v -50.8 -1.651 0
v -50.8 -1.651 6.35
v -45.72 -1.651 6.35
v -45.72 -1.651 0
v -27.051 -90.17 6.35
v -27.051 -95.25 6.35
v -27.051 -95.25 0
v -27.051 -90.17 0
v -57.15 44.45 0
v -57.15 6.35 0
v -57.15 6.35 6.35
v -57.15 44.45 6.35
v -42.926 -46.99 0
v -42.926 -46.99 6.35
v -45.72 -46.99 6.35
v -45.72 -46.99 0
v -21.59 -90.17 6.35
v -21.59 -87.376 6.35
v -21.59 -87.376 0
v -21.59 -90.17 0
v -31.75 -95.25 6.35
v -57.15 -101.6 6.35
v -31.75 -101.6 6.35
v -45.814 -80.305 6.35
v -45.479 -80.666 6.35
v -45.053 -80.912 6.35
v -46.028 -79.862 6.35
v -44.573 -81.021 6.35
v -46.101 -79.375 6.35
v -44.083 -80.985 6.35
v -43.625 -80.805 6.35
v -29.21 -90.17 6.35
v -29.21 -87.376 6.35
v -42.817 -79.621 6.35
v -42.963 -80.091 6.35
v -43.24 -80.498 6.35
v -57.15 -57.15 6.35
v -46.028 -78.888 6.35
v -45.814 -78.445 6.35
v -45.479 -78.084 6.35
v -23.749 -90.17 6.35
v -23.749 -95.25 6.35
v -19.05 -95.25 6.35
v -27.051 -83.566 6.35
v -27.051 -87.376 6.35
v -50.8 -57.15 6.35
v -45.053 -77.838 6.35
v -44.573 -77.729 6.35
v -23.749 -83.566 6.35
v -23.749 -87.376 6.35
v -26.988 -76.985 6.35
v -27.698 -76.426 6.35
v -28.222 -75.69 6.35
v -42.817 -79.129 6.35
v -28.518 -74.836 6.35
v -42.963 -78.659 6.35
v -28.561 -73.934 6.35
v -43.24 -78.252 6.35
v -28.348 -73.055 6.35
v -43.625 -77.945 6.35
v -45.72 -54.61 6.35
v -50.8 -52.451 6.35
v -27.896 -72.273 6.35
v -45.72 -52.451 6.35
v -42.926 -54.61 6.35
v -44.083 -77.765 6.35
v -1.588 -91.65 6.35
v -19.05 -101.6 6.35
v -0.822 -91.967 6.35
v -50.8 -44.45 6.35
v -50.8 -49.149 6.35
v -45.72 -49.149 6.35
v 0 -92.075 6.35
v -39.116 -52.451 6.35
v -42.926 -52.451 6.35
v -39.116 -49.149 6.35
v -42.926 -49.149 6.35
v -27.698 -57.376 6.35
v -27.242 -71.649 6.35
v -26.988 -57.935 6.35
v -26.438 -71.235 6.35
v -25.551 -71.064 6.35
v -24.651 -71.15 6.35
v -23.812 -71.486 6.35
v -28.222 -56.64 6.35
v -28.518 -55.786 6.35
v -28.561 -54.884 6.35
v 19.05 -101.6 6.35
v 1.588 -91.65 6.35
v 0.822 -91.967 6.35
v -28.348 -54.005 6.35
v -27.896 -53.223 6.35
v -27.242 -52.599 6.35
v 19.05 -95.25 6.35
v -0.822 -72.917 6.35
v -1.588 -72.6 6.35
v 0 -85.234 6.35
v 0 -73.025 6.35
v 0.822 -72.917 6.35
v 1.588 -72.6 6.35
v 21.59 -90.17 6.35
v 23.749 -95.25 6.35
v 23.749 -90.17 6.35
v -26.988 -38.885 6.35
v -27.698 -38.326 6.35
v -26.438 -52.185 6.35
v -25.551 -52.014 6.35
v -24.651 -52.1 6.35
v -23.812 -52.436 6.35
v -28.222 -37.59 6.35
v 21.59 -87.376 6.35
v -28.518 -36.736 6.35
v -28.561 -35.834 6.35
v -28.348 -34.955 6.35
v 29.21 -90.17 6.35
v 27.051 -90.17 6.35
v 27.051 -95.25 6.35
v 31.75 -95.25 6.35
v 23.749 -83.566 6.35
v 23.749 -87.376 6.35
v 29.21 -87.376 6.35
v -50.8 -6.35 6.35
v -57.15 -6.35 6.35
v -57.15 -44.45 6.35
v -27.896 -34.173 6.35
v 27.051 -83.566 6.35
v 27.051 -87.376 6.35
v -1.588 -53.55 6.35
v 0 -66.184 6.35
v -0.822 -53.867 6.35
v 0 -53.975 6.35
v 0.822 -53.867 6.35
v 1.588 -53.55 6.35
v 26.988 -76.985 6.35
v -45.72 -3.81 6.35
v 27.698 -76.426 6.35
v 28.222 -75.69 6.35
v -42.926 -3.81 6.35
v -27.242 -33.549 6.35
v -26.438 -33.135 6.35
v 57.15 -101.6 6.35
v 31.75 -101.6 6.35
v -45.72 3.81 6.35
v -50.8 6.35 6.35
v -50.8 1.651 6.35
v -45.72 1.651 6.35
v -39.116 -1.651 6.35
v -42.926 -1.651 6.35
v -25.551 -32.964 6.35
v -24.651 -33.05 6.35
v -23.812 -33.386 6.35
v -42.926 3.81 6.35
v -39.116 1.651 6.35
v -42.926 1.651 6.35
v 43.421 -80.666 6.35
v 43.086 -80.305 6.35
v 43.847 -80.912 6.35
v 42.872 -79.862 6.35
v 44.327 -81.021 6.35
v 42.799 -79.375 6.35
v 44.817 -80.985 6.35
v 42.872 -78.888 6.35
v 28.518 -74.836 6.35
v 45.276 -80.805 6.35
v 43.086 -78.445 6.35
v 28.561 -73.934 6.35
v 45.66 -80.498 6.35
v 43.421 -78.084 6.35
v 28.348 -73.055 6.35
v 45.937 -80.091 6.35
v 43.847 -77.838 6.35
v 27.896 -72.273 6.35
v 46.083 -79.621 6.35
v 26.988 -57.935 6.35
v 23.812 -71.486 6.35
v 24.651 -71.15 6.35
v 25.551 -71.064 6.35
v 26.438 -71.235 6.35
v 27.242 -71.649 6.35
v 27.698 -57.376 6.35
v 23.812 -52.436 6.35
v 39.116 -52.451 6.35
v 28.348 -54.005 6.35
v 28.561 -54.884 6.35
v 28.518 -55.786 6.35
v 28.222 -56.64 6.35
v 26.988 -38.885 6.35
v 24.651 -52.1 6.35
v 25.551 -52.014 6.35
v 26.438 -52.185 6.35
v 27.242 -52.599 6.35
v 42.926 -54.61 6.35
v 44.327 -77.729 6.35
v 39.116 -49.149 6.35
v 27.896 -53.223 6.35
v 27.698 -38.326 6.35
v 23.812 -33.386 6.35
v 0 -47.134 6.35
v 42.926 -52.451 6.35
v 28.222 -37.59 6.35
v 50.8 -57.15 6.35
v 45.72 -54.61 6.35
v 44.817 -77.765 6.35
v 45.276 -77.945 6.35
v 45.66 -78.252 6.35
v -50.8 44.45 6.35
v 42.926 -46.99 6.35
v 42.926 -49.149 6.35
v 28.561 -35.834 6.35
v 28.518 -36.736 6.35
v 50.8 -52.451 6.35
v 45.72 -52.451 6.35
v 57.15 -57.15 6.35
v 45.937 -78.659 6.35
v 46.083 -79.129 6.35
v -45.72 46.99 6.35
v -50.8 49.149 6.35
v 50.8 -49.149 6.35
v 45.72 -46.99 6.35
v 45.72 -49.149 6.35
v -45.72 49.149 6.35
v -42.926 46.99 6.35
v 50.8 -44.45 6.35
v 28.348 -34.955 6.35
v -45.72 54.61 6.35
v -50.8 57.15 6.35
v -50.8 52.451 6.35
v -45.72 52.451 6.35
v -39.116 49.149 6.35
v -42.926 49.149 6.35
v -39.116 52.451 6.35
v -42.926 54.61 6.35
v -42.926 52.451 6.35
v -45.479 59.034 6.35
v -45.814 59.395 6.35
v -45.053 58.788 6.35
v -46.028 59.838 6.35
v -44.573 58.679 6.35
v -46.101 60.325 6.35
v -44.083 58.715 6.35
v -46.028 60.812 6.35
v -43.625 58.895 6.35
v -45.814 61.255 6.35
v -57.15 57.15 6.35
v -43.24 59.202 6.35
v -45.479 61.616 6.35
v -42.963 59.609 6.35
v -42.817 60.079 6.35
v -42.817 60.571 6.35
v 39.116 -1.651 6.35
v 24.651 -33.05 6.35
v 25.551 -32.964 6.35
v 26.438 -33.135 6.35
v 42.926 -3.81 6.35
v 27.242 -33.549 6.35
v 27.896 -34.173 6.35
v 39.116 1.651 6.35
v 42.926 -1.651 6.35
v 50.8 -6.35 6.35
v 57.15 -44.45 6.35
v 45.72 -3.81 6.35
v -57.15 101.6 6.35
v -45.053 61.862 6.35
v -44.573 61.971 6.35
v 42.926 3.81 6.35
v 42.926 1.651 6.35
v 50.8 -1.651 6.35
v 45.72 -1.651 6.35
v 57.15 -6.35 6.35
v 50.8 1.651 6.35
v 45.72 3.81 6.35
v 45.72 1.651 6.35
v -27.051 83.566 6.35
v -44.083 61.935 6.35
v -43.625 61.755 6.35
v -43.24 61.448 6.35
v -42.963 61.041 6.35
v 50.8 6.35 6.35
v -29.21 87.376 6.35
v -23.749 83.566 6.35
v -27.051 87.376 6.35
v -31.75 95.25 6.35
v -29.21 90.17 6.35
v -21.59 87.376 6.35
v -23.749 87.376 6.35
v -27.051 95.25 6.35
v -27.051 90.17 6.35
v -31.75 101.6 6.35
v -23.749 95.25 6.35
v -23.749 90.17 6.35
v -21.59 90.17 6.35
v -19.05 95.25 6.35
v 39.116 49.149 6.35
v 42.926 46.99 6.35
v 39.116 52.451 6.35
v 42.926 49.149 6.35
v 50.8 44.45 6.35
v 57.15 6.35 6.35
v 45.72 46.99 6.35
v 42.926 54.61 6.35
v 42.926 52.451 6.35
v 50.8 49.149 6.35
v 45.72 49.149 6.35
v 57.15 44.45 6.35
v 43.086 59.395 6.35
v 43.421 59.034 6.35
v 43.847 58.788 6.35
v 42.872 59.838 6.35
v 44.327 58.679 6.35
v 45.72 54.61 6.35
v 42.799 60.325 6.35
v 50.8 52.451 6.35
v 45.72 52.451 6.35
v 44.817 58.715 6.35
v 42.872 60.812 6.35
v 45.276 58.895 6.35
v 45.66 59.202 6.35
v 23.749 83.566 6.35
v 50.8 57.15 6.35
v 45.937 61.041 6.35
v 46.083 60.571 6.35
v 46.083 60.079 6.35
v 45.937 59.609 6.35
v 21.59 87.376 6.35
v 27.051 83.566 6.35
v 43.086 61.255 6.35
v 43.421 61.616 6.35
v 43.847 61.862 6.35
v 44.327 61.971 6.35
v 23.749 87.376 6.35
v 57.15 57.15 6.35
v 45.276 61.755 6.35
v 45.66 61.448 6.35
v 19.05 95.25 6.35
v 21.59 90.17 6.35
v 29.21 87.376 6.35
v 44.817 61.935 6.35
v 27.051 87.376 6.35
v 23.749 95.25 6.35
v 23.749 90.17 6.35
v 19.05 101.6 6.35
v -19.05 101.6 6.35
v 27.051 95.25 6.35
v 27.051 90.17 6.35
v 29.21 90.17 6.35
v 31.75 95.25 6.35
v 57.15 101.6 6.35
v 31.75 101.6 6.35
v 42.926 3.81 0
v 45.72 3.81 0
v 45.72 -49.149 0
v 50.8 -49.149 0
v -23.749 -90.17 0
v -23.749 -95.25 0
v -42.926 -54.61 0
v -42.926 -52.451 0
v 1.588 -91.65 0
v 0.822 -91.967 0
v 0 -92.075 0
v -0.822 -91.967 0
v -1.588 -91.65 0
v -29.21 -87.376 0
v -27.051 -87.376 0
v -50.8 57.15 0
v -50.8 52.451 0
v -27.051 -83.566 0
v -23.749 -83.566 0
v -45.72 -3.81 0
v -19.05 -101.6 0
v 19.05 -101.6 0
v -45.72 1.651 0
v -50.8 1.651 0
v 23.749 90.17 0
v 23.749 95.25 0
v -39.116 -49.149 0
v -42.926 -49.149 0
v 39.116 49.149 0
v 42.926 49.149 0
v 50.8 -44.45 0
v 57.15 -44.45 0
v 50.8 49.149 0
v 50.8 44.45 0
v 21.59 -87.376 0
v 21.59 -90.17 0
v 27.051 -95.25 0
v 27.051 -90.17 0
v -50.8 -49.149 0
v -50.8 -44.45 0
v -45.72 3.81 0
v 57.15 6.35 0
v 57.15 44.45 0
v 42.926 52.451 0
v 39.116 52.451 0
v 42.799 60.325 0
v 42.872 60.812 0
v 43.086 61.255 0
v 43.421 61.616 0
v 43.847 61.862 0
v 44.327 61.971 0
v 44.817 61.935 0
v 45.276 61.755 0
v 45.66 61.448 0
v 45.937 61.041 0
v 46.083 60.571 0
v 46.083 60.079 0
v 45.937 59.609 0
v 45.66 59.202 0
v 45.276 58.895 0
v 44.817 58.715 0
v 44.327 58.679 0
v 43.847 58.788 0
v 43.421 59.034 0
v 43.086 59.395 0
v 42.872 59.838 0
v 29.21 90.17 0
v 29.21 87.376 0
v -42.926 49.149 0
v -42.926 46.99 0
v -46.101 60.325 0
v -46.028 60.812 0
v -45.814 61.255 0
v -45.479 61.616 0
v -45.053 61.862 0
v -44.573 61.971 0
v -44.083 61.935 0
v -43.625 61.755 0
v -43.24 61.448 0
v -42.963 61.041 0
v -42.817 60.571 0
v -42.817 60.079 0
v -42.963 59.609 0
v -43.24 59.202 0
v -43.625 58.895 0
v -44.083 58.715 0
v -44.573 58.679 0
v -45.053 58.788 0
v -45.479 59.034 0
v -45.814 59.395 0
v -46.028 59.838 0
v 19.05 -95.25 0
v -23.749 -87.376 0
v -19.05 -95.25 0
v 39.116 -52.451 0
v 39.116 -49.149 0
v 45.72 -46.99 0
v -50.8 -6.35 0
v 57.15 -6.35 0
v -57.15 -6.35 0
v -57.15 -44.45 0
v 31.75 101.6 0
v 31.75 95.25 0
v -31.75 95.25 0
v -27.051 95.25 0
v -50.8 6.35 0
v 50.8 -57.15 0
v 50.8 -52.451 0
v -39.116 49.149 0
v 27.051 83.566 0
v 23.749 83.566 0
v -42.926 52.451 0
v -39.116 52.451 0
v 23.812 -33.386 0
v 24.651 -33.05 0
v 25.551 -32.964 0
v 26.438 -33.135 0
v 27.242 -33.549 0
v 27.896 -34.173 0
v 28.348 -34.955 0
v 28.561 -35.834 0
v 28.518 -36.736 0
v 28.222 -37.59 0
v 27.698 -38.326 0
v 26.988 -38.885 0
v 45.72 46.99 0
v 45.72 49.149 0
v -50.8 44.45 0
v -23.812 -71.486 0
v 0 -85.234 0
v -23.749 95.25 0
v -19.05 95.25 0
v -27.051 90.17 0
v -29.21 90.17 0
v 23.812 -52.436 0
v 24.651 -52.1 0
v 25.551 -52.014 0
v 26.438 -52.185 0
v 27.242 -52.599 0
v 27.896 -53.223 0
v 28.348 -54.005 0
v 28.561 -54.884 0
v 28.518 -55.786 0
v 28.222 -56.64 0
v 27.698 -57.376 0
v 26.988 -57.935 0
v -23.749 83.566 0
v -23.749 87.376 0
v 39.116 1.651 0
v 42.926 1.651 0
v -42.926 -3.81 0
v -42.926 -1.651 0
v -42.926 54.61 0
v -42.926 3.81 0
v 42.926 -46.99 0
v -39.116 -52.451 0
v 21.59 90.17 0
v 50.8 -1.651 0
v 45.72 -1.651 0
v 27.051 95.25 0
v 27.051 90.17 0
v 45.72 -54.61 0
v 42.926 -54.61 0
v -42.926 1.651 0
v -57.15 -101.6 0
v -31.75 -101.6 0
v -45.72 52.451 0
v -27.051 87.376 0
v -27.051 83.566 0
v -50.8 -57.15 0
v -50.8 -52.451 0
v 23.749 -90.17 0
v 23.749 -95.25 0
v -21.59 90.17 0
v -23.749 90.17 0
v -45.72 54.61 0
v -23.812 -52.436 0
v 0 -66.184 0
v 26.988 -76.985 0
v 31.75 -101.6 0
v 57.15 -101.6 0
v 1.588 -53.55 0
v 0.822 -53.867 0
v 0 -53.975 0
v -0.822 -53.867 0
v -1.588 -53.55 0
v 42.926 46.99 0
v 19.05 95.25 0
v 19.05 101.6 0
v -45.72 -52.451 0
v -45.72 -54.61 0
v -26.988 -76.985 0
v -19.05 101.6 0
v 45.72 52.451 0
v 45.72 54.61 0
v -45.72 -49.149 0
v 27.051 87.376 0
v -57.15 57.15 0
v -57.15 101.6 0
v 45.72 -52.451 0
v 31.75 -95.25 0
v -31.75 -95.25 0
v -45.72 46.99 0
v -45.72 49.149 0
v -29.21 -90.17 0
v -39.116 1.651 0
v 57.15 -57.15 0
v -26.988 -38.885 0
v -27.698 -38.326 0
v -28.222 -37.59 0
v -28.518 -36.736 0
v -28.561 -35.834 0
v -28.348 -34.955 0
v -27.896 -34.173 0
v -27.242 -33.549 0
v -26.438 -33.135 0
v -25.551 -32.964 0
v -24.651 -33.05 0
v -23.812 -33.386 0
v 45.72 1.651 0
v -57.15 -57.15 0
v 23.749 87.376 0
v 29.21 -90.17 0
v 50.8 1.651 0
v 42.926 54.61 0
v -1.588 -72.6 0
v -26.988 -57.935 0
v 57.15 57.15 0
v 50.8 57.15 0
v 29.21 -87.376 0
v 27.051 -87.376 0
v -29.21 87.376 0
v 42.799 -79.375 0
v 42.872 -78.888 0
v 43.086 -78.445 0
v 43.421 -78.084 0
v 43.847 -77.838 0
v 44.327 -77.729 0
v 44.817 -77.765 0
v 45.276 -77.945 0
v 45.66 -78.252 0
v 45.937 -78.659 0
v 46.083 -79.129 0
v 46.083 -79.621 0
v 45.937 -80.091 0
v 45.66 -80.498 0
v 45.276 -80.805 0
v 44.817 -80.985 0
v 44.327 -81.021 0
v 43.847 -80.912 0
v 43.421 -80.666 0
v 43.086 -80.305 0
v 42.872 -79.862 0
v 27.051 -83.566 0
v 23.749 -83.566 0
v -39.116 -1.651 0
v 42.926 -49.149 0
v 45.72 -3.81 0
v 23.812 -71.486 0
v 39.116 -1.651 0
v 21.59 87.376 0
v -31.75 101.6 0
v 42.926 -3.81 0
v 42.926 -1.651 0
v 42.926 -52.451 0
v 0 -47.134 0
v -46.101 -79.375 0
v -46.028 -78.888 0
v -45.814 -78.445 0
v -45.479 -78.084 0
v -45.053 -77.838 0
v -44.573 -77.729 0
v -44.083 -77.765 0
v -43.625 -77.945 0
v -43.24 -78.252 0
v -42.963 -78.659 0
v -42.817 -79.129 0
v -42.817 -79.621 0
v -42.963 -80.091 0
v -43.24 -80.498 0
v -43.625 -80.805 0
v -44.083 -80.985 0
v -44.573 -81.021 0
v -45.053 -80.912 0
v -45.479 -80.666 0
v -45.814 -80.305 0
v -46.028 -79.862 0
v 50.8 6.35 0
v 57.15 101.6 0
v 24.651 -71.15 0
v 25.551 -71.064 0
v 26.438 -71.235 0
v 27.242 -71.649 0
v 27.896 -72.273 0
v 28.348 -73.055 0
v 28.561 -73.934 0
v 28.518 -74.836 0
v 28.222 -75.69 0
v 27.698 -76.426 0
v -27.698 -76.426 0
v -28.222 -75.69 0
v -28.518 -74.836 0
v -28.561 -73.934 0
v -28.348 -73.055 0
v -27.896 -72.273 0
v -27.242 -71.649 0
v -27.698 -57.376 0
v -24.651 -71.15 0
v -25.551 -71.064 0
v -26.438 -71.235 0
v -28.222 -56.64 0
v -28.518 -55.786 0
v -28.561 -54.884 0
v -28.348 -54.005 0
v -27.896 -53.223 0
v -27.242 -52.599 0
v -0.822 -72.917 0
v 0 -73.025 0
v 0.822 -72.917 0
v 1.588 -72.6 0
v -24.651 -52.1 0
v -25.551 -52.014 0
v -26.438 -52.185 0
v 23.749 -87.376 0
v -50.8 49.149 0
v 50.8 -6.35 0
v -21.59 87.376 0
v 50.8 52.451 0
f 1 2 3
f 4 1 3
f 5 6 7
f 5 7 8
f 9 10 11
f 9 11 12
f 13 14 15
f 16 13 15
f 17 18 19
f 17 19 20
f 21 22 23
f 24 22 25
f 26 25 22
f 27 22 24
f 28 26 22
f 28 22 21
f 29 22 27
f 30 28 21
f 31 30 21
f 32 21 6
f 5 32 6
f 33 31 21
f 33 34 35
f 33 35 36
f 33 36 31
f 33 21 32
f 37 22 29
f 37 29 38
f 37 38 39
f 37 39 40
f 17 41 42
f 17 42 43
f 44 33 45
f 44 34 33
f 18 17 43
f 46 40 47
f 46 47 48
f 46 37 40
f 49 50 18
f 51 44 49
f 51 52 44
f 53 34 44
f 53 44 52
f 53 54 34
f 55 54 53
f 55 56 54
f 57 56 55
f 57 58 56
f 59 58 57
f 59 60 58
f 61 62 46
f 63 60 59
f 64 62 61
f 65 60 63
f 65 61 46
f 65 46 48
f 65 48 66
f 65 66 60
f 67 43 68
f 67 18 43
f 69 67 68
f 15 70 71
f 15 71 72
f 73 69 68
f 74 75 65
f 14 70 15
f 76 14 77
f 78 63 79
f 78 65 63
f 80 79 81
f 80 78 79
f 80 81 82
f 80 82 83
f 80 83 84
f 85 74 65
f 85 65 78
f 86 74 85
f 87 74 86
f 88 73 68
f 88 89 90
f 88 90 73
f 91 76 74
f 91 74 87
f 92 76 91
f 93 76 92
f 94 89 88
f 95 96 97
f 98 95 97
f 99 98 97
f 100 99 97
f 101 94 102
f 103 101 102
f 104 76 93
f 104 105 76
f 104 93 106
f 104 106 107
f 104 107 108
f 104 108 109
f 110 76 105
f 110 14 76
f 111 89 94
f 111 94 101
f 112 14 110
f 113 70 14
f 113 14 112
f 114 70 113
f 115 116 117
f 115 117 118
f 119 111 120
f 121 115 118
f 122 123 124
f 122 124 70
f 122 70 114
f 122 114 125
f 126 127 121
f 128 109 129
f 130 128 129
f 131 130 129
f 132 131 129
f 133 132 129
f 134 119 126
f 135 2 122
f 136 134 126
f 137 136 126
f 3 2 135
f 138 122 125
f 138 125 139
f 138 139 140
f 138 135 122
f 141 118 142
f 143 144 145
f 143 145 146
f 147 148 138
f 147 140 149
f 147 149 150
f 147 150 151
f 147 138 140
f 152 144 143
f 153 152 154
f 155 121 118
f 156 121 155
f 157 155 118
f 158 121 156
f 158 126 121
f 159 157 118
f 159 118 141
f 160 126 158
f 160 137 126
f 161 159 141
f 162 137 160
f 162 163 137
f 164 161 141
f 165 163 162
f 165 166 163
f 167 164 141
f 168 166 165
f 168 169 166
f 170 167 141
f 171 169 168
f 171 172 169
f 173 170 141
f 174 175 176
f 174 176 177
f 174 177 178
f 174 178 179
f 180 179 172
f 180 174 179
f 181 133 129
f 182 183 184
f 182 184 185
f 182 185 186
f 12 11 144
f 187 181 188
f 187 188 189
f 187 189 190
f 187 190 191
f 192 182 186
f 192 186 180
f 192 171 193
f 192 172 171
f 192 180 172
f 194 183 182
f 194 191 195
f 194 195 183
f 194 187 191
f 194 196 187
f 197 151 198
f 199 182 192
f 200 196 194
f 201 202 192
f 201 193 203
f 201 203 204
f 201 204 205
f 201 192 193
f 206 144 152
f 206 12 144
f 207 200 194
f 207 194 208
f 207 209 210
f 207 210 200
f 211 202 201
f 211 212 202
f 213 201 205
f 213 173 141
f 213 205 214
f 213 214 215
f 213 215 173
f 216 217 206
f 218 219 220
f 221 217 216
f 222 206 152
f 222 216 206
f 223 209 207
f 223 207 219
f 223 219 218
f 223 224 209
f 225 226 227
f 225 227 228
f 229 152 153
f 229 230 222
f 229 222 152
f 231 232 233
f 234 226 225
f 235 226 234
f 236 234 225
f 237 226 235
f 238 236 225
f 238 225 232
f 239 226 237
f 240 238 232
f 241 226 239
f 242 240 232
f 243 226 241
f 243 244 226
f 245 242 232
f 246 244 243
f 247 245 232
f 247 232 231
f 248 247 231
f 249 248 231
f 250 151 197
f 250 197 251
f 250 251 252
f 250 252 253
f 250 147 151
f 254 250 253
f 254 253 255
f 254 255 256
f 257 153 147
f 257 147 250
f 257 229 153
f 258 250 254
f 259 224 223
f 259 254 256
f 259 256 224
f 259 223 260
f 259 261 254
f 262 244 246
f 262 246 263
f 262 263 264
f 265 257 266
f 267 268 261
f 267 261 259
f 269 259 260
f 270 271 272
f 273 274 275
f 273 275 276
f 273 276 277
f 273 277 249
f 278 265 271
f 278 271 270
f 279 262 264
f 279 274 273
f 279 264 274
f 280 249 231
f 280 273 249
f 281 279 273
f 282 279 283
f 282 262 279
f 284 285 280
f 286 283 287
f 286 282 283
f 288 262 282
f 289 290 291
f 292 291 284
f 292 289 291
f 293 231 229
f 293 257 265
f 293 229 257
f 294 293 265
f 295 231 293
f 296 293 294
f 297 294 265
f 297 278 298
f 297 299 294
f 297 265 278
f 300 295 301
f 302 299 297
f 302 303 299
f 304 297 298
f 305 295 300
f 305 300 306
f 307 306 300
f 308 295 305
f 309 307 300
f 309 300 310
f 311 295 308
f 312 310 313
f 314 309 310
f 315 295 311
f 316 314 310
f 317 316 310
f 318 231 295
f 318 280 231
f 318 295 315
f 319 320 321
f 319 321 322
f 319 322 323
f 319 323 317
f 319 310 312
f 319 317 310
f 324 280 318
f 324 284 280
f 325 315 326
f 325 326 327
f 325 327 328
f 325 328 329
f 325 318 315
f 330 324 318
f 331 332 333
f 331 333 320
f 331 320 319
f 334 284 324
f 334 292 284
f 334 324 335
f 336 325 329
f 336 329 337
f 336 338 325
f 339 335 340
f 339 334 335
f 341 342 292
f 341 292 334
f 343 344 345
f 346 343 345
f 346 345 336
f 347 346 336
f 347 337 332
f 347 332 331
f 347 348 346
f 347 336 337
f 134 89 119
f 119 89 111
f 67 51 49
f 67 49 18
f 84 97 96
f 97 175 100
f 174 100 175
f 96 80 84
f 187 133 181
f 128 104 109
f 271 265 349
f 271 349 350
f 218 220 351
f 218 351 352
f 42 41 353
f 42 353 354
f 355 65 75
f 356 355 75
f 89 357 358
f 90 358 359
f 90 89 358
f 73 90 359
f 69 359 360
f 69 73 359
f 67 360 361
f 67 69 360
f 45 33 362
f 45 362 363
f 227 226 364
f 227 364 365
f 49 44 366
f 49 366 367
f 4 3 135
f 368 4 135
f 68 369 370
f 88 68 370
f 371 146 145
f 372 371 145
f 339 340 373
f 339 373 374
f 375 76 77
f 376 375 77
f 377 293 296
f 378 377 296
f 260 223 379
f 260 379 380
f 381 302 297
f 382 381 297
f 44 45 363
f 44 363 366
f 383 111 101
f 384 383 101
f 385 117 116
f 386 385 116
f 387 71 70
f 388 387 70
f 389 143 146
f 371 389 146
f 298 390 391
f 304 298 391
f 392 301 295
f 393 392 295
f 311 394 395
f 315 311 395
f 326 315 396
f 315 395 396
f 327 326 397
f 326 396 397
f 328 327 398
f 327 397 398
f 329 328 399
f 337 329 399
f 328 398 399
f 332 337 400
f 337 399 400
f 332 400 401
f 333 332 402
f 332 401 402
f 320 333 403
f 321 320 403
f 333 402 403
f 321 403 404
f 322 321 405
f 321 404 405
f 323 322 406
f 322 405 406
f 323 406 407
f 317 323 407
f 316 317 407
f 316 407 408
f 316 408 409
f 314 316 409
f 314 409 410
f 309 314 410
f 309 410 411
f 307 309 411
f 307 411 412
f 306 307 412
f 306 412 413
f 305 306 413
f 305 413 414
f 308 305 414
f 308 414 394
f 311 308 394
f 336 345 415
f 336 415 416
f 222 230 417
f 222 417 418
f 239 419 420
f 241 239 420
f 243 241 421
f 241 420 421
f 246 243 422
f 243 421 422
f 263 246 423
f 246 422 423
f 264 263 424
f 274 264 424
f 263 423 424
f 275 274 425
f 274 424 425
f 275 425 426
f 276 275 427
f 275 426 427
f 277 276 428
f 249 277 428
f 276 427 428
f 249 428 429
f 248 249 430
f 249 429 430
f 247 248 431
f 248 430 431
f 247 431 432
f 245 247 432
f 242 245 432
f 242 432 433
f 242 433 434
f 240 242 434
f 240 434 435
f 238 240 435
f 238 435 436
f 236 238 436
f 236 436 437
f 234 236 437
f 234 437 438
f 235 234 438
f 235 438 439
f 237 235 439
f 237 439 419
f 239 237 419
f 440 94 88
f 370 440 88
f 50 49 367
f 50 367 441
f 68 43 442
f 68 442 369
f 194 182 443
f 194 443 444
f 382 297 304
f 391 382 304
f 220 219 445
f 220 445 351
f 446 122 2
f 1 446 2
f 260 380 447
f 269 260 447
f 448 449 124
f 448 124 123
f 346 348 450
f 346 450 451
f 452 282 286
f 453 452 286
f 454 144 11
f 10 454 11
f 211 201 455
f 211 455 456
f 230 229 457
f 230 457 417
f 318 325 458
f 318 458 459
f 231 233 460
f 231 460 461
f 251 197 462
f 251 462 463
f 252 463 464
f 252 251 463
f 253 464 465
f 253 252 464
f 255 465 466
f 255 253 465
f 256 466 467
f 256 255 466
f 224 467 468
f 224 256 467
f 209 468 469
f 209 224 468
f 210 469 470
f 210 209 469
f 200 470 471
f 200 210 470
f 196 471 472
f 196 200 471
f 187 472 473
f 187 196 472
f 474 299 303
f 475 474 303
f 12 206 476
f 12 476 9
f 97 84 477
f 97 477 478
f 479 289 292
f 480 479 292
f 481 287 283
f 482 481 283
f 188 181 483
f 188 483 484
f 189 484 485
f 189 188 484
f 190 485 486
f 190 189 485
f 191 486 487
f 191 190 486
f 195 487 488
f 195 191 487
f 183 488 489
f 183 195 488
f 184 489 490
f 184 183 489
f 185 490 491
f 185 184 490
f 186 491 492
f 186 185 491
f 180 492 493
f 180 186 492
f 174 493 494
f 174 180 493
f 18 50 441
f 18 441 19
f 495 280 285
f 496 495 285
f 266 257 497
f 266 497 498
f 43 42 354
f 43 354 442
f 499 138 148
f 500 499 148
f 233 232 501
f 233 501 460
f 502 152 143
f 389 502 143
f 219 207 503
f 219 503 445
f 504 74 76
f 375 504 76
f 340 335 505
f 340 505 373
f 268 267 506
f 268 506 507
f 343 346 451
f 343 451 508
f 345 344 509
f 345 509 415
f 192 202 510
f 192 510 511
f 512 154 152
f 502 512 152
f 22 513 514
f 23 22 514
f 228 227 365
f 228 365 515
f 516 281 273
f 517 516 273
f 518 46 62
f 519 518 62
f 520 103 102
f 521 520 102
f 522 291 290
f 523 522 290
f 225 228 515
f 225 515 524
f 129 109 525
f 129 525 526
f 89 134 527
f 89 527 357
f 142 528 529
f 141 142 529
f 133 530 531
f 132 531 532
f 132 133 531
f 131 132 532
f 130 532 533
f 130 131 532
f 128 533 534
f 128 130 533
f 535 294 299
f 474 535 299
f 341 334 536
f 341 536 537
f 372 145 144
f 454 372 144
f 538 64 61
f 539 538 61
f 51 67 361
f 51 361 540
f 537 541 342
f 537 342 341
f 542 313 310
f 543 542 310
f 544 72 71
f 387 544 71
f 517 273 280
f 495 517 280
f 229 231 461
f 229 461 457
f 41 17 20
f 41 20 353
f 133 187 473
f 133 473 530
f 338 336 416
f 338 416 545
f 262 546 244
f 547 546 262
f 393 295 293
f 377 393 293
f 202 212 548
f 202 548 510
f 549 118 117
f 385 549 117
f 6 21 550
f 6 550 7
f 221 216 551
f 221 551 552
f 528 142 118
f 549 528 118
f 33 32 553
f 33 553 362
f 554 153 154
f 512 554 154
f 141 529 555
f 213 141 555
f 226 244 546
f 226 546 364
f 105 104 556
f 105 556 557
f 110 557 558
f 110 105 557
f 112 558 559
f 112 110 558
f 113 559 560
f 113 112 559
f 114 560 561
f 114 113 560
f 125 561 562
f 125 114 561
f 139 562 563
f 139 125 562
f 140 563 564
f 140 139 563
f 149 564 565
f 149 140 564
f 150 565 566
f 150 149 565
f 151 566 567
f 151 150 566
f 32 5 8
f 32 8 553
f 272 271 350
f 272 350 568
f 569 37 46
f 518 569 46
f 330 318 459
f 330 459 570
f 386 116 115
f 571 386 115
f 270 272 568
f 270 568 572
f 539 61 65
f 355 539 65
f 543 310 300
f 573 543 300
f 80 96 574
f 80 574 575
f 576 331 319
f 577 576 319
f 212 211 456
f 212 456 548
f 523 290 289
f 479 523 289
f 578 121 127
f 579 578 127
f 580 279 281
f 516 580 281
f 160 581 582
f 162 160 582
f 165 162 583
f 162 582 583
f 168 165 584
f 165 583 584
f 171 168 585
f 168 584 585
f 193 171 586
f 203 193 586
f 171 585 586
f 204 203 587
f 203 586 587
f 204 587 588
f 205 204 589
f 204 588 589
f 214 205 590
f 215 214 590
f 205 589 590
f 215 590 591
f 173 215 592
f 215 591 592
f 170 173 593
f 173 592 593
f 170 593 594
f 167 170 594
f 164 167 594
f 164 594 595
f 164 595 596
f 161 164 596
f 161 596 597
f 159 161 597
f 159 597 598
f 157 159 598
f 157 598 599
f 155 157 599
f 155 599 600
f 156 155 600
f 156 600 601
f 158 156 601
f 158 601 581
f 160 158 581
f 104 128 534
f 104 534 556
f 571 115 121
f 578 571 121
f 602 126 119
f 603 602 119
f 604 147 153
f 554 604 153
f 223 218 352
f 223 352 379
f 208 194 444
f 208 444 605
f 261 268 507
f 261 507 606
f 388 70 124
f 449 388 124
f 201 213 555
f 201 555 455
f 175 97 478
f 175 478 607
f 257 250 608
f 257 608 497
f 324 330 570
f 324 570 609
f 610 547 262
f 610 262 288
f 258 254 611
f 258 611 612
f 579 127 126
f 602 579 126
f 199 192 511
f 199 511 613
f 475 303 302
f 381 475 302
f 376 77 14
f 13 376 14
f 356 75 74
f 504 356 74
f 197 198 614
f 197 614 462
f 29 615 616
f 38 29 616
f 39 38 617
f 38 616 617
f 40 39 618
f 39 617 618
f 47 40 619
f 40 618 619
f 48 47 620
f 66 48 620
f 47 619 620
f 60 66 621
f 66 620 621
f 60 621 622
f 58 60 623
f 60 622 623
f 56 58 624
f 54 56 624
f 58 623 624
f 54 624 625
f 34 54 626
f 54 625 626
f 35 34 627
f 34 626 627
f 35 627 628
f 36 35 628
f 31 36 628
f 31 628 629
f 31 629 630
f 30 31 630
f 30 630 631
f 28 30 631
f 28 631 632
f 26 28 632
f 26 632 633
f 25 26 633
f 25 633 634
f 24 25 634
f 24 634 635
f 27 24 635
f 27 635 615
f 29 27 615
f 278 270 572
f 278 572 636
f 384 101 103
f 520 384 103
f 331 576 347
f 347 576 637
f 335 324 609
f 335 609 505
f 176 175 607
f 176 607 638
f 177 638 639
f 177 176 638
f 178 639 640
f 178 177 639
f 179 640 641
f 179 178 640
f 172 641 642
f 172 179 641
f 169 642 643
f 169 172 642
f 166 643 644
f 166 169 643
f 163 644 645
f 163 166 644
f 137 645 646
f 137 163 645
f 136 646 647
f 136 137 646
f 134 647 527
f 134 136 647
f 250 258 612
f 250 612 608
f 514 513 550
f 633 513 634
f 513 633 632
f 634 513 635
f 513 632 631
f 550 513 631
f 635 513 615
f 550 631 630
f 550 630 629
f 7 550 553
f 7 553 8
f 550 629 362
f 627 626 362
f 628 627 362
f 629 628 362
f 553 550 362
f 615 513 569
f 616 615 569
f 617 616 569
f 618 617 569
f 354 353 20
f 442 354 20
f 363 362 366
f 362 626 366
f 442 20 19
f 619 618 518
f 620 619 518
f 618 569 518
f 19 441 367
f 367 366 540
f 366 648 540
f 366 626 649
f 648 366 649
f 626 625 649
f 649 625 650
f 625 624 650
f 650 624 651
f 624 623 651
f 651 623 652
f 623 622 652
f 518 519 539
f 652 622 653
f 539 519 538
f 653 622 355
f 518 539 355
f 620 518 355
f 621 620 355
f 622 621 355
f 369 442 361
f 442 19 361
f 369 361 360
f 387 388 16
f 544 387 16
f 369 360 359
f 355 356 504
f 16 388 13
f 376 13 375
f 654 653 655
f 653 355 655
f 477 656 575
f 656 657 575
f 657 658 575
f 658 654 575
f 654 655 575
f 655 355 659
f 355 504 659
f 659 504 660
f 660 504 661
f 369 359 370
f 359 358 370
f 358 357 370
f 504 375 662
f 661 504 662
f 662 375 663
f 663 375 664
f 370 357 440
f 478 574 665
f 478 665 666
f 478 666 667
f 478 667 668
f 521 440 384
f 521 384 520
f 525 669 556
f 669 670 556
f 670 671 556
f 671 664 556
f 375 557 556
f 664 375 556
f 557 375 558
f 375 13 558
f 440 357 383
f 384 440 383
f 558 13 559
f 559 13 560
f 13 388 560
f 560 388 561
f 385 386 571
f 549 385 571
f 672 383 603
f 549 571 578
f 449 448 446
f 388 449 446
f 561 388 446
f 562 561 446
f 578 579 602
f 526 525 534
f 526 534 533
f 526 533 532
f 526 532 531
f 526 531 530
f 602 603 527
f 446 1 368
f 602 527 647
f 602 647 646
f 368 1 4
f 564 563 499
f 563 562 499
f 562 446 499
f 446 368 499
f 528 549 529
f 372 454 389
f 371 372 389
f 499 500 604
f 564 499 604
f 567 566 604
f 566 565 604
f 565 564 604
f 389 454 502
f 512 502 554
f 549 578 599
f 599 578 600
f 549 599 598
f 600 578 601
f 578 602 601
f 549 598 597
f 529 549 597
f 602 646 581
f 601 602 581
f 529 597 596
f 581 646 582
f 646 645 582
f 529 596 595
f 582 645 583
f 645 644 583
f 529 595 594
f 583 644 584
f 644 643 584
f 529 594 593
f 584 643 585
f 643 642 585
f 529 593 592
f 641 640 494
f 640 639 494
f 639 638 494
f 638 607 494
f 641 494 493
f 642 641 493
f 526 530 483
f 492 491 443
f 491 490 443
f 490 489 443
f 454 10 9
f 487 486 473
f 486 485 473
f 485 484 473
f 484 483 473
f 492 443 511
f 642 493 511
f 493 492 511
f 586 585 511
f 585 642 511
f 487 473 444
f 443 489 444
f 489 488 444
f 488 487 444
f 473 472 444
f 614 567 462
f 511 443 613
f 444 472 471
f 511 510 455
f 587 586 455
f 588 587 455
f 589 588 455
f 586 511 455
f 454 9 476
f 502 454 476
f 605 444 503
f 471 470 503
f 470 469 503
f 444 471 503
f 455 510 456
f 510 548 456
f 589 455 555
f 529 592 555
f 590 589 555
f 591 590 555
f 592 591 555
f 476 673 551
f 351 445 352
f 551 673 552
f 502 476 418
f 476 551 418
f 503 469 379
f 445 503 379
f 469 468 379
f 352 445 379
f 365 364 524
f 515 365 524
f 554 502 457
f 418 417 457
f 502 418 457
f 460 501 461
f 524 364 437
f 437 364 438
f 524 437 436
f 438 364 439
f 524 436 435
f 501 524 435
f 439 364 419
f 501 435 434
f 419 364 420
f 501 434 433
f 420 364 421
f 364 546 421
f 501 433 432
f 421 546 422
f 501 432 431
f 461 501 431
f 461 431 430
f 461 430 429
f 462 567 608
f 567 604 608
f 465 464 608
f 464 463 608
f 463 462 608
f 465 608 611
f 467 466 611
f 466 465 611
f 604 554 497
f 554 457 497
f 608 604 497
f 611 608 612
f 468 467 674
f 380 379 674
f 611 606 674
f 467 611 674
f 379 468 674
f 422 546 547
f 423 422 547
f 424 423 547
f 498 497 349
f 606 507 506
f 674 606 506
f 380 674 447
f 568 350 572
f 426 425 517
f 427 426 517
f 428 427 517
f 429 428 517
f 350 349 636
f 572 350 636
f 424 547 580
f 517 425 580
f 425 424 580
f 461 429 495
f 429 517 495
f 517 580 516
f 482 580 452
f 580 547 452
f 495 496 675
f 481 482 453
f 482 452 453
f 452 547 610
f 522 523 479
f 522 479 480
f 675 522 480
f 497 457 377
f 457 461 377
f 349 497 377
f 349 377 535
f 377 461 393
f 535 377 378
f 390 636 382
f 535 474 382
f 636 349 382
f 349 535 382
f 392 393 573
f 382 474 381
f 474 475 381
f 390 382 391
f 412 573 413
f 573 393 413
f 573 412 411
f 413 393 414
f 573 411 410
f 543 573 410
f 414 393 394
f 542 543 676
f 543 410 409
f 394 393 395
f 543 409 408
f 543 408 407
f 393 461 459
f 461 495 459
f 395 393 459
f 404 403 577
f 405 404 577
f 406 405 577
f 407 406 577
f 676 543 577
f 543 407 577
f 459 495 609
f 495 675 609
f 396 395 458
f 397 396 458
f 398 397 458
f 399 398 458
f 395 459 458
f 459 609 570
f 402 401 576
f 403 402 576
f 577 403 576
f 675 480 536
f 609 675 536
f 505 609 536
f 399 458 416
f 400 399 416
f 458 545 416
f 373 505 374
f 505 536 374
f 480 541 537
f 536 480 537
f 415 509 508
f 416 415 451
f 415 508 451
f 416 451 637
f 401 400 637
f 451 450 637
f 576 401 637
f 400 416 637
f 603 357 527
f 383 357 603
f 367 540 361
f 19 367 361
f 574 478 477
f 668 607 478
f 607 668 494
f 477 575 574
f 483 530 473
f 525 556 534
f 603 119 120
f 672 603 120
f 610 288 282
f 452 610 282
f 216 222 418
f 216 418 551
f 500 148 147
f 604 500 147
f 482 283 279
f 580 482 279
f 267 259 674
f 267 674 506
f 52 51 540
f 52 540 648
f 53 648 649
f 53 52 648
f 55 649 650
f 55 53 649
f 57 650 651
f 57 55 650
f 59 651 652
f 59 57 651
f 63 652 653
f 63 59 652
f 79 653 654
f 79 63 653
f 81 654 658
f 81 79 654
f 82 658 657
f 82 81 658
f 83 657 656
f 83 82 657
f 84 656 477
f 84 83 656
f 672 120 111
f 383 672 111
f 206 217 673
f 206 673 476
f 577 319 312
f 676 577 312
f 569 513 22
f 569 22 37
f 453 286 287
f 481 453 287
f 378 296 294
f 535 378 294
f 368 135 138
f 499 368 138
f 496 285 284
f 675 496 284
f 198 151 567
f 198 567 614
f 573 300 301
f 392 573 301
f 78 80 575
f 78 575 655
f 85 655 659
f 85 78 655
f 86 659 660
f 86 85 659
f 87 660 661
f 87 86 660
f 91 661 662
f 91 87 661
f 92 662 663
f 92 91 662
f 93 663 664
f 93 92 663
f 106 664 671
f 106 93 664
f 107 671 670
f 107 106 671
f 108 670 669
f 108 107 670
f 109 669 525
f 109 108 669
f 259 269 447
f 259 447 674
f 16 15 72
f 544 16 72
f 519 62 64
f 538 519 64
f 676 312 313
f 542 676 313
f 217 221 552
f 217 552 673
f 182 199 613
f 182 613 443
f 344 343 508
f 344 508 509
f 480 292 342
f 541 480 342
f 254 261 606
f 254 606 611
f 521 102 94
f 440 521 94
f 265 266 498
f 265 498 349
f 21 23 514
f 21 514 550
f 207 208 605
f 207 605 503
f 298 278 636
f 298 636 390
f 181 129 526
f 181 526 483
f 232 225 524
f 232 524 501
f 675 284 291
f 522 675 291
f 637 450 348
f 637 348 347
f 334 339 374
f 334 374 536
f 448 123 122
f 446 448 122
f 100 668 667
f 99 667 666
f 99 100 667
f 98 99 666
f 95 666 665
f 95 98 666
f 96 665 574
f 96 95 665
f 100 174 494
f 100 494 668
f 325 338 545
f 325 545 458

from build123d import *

# Parameters (mm, degrees)
SKETCH1_W            = 114.3
SKETCH1_H            = 203.2
BOSS_EXTRUDE1_DEPTH  = 6.35
CUT_EXTRUDE2_DEPTH   = 117.743329574
CUT_EXTRUDE3_DEPTH   = 117.743329574
CUT_EXTRUDE4_DEPTH   = 117.743329574
MIRROR3_COPY_1_DEPTH = 117.743329574
MIRROR3_COPY_2_DEPTH = 117.743329574
SKETCH7_R            = 1.651
CUT_EXTRUDE7_DEPTH   = 117.743329574
CUT_EXTRUDE8_DEPTH   = 117.743329574
LPATTERN1_COUNT      = 3
LPATTERN1_PITCH      = 19.05


with BuildPart() as part:
    # Sketch1 → Boss-Extrude1 (new body)
    with BuildSketch(Plane.XY):
        Rectangle(SKETCH1_W, SKETCH1_H)
    extrude(amount=BOSS_EXTRUDE1_DEPTH)

    # Sketch2 → Cut-Extrude2 (cut, through all)
    with BuildSketch(Plane.XY.offset(6.35)):
        Polygon((-57.15, 6.35), (-57.15, -6.35), (-50.8, -6.35), (-50.8, -1.651), (-45.72, -1.651), (-45.72, -3.81), (-42.926, -3.81), (-42.926, -1.651), (-39.116, -1.651), (-39.116, 1.651), (-42.926, 1.651), (-42.926, 3.81), (-45.72, 3.81), (-45.72, 1.651), (-50.8, 1.651), (-50.8, 6.35), align=None)
    cut_extrude2 = extrude(amount=-CUT_EXTRUDE2_DEPTH, mode=Mode.SUBTRACT)

    # Sketch3 → Cut-Extrude3 (cut, through all)
    with BuildSketch(Plane.XY.offset(6.35)):
        Polygon((-31.75, 101.6), (-31.75, 95.25), (-27.051, 95.25), (-27.051, 90.17), (-29.21, 90.17), (-29.21, 87.376), (-27.051, 87.376), (-27.051, 83.566), (-23.749, 83.566), (-23.749, 87.376), (-21.59, 87.376), (-21.59, 90.17), (-23.749, 90.17), (-23.749, 95.25), (-19.05, 95.25), (-19.05, 101.6), align=None)
    cut_extrude3 = extrude(amount=-CUT_EXTRUDE3_DEPTH, mode=Mode.SUBTRACT)

    # Sketch4 → Cut-Extrude4 (cut, through all)
    with BuildSketch(Plane.XY.offset(6.35)):
        Polygon((-57.15, 57.15), (-50.8, 57.15), (-50.8, 52.451), (-45.72, 52.451), (-45.72, 54.61), (-42.926, 54.61), (-42.926, 52.451), (-39.116, 52.451), (-39.116, 49.149), (-42.926, 49.149), (-42.926, 46.99), (-45.72, 46.99), (-45.72, 49.149), (-50.8, 49.149), (-50.8, 44.45), (-57.15, 44.45), align=None)
    cut_extrude4 = extrude(amount=-CUT_EXTRUDE4_DEPTH, mode=Mode.SUBTRACT)

    # Mirror1: Cut-Extrude3, Cut-Extrude4 across plane
    add(cut_extrude3.mirror(Plane.ZX), mode=Mode.SUBTRACT)
    add(cut_extrude4.mirror(Plane.ZX), mode=Mode.SUBTRACT)

    # Mirror3: Cut-Extrude2, Cut-Extrude3, Cut-Extrude4 across plane
    add(cut_extrude2.mirror(Plane(origin=(0, 0, 0), x_dir=(0, 0, 1), z_dir=(1, 0, 0))), mode=Mode.SUBTRACT)
    add(cut_extrude3.mirror(Plane(origin=(0, 0, 0), x_dir=(0, 0, 1), z_dir=(1, 0, 0))), mode=Mode.SUBTRACT)
    add(cut_extrude4.mirror(Plane(origin=(0, 0, 0), x_dir=(0, 0, 1), z_dir=(1, 0, 0))), mode=Mode.SUBTRACT)

    # Mirror3 copy 1 sketch → Mirror3 copy 1 (cut, through all)
    with BuildSketch(Plane(origin=(0, 0, 6.35), x_dir=(-1, 0, 0), z_dir=(0, 0, 1))):
        Polygon((-31.75, 101.6), (-31.75, 95.25), (-27.051, 95.25), (-27.051, 90.17), (-29.21, 90.17), (-29.21, 87.376), (-27.051, 87.376), (-27.051, 83.566), (-23.749, 83.566), (-23.749, 87.376), (-21.59, 87.376), (-21.59, 90.17), (-23.749, 90.17), (-23.749, 95.25), (-19.05, 95.25), (-19.05, 101.6), align=None)
    extrude(amount=-MIRROR3_COPY_1_DEPTH, mode=Mode.SUBTRACT)

    # Mirror3 copy 2 sketch → Mirror3 copy 2 (cut, through all)
    with BuildSketch(Plane(origin=(0, 0, 6.35), x_dir=(-1, 0, 0), z_dir=(0, 0, 1))):
        Polygon((-57.15, 57.15), (-50.8, 57.15), (-50.8, 52.451), (-45.72, 52.451), (-45.72, 54.61), (-42.926, 54.61), (-42.926, 52.451), (-39.116, 52.451), (-39.116, 49.149), (-42.926, 49.149), (-42.926, 46.99), (-45.72, 46.99), (-45.72, 49.149), (-50.8, 49.149), (-50.8, 44.45), (-57.15, 44.45), align=None)
    extrude(amount=-MIRROR3_COPY_2_DEPTH, mode=Mode.SUBTRACT)

    # Sketch7 → Cut-Extrude7 (cut, through all)
    with BuildSketch(Plane(origin=(0, 0, 0), x_dir=(-1, 0, 0), z_dir=(0, 0, -1))):
        with Locations((-44.45, 60.325)):
            Circle(SKETCH7_R)
        with Locations((44.45, 60.325)):
            Circle(SKETCH7_R)
        with Locations((44.45, -79.375)):
            Circle(SKETCH7_R)
        with Locations((-44.45, -79.375)):
            Circle(SKETCH7_R)
    extrude(amount=-CUT_EXTRUDE7_DEPTH, mode=Mode.SUBTRACT)

    # Sketch8 → Cut-Extrude8 (cut, through all)
    with BuildSketch(Plane.XY.offset(6.35)):
        with BuildLine():
            Line((26.9875, -76.98493382), (1.5875, -91.649630657))
            ThreePointArc((1.5875, -91.649630657), (0, -92.075), (-1.5875, -91.649630657))
            Line((-1.5875, -91.649630657), (-26.9875, -76.98493382))
            ThreePointArc((-26.9875, -76.98493382), (-28.149630657, -72.647803163), (-23.8125, -71.485672506))
            Line((-23.8125, -71.485672506), (0, -85.233825791))
            Line((0, -85.233825791), (23.8125, -71.485672506))
            ThreePointArc((23.8125, -71.485672506), (28.149630657, -72.647803163), (26.9875, -76.98493382))
        make_face()
    cut_extrude8 = extrude(amount=-CUT_EXTRUDE8_DEPTH, mode=Mode.SUBTRACT)

    # LPattern1: Cut-Extrude8 ×3
    with Locations(*[(0, i * LPATTERN1_PITCH, 0) for i in range(1, LPATTERN1_COUNT)]):
        add(cut_extrude8, mode=Mode.SUBTRACT)


solid = part.part
